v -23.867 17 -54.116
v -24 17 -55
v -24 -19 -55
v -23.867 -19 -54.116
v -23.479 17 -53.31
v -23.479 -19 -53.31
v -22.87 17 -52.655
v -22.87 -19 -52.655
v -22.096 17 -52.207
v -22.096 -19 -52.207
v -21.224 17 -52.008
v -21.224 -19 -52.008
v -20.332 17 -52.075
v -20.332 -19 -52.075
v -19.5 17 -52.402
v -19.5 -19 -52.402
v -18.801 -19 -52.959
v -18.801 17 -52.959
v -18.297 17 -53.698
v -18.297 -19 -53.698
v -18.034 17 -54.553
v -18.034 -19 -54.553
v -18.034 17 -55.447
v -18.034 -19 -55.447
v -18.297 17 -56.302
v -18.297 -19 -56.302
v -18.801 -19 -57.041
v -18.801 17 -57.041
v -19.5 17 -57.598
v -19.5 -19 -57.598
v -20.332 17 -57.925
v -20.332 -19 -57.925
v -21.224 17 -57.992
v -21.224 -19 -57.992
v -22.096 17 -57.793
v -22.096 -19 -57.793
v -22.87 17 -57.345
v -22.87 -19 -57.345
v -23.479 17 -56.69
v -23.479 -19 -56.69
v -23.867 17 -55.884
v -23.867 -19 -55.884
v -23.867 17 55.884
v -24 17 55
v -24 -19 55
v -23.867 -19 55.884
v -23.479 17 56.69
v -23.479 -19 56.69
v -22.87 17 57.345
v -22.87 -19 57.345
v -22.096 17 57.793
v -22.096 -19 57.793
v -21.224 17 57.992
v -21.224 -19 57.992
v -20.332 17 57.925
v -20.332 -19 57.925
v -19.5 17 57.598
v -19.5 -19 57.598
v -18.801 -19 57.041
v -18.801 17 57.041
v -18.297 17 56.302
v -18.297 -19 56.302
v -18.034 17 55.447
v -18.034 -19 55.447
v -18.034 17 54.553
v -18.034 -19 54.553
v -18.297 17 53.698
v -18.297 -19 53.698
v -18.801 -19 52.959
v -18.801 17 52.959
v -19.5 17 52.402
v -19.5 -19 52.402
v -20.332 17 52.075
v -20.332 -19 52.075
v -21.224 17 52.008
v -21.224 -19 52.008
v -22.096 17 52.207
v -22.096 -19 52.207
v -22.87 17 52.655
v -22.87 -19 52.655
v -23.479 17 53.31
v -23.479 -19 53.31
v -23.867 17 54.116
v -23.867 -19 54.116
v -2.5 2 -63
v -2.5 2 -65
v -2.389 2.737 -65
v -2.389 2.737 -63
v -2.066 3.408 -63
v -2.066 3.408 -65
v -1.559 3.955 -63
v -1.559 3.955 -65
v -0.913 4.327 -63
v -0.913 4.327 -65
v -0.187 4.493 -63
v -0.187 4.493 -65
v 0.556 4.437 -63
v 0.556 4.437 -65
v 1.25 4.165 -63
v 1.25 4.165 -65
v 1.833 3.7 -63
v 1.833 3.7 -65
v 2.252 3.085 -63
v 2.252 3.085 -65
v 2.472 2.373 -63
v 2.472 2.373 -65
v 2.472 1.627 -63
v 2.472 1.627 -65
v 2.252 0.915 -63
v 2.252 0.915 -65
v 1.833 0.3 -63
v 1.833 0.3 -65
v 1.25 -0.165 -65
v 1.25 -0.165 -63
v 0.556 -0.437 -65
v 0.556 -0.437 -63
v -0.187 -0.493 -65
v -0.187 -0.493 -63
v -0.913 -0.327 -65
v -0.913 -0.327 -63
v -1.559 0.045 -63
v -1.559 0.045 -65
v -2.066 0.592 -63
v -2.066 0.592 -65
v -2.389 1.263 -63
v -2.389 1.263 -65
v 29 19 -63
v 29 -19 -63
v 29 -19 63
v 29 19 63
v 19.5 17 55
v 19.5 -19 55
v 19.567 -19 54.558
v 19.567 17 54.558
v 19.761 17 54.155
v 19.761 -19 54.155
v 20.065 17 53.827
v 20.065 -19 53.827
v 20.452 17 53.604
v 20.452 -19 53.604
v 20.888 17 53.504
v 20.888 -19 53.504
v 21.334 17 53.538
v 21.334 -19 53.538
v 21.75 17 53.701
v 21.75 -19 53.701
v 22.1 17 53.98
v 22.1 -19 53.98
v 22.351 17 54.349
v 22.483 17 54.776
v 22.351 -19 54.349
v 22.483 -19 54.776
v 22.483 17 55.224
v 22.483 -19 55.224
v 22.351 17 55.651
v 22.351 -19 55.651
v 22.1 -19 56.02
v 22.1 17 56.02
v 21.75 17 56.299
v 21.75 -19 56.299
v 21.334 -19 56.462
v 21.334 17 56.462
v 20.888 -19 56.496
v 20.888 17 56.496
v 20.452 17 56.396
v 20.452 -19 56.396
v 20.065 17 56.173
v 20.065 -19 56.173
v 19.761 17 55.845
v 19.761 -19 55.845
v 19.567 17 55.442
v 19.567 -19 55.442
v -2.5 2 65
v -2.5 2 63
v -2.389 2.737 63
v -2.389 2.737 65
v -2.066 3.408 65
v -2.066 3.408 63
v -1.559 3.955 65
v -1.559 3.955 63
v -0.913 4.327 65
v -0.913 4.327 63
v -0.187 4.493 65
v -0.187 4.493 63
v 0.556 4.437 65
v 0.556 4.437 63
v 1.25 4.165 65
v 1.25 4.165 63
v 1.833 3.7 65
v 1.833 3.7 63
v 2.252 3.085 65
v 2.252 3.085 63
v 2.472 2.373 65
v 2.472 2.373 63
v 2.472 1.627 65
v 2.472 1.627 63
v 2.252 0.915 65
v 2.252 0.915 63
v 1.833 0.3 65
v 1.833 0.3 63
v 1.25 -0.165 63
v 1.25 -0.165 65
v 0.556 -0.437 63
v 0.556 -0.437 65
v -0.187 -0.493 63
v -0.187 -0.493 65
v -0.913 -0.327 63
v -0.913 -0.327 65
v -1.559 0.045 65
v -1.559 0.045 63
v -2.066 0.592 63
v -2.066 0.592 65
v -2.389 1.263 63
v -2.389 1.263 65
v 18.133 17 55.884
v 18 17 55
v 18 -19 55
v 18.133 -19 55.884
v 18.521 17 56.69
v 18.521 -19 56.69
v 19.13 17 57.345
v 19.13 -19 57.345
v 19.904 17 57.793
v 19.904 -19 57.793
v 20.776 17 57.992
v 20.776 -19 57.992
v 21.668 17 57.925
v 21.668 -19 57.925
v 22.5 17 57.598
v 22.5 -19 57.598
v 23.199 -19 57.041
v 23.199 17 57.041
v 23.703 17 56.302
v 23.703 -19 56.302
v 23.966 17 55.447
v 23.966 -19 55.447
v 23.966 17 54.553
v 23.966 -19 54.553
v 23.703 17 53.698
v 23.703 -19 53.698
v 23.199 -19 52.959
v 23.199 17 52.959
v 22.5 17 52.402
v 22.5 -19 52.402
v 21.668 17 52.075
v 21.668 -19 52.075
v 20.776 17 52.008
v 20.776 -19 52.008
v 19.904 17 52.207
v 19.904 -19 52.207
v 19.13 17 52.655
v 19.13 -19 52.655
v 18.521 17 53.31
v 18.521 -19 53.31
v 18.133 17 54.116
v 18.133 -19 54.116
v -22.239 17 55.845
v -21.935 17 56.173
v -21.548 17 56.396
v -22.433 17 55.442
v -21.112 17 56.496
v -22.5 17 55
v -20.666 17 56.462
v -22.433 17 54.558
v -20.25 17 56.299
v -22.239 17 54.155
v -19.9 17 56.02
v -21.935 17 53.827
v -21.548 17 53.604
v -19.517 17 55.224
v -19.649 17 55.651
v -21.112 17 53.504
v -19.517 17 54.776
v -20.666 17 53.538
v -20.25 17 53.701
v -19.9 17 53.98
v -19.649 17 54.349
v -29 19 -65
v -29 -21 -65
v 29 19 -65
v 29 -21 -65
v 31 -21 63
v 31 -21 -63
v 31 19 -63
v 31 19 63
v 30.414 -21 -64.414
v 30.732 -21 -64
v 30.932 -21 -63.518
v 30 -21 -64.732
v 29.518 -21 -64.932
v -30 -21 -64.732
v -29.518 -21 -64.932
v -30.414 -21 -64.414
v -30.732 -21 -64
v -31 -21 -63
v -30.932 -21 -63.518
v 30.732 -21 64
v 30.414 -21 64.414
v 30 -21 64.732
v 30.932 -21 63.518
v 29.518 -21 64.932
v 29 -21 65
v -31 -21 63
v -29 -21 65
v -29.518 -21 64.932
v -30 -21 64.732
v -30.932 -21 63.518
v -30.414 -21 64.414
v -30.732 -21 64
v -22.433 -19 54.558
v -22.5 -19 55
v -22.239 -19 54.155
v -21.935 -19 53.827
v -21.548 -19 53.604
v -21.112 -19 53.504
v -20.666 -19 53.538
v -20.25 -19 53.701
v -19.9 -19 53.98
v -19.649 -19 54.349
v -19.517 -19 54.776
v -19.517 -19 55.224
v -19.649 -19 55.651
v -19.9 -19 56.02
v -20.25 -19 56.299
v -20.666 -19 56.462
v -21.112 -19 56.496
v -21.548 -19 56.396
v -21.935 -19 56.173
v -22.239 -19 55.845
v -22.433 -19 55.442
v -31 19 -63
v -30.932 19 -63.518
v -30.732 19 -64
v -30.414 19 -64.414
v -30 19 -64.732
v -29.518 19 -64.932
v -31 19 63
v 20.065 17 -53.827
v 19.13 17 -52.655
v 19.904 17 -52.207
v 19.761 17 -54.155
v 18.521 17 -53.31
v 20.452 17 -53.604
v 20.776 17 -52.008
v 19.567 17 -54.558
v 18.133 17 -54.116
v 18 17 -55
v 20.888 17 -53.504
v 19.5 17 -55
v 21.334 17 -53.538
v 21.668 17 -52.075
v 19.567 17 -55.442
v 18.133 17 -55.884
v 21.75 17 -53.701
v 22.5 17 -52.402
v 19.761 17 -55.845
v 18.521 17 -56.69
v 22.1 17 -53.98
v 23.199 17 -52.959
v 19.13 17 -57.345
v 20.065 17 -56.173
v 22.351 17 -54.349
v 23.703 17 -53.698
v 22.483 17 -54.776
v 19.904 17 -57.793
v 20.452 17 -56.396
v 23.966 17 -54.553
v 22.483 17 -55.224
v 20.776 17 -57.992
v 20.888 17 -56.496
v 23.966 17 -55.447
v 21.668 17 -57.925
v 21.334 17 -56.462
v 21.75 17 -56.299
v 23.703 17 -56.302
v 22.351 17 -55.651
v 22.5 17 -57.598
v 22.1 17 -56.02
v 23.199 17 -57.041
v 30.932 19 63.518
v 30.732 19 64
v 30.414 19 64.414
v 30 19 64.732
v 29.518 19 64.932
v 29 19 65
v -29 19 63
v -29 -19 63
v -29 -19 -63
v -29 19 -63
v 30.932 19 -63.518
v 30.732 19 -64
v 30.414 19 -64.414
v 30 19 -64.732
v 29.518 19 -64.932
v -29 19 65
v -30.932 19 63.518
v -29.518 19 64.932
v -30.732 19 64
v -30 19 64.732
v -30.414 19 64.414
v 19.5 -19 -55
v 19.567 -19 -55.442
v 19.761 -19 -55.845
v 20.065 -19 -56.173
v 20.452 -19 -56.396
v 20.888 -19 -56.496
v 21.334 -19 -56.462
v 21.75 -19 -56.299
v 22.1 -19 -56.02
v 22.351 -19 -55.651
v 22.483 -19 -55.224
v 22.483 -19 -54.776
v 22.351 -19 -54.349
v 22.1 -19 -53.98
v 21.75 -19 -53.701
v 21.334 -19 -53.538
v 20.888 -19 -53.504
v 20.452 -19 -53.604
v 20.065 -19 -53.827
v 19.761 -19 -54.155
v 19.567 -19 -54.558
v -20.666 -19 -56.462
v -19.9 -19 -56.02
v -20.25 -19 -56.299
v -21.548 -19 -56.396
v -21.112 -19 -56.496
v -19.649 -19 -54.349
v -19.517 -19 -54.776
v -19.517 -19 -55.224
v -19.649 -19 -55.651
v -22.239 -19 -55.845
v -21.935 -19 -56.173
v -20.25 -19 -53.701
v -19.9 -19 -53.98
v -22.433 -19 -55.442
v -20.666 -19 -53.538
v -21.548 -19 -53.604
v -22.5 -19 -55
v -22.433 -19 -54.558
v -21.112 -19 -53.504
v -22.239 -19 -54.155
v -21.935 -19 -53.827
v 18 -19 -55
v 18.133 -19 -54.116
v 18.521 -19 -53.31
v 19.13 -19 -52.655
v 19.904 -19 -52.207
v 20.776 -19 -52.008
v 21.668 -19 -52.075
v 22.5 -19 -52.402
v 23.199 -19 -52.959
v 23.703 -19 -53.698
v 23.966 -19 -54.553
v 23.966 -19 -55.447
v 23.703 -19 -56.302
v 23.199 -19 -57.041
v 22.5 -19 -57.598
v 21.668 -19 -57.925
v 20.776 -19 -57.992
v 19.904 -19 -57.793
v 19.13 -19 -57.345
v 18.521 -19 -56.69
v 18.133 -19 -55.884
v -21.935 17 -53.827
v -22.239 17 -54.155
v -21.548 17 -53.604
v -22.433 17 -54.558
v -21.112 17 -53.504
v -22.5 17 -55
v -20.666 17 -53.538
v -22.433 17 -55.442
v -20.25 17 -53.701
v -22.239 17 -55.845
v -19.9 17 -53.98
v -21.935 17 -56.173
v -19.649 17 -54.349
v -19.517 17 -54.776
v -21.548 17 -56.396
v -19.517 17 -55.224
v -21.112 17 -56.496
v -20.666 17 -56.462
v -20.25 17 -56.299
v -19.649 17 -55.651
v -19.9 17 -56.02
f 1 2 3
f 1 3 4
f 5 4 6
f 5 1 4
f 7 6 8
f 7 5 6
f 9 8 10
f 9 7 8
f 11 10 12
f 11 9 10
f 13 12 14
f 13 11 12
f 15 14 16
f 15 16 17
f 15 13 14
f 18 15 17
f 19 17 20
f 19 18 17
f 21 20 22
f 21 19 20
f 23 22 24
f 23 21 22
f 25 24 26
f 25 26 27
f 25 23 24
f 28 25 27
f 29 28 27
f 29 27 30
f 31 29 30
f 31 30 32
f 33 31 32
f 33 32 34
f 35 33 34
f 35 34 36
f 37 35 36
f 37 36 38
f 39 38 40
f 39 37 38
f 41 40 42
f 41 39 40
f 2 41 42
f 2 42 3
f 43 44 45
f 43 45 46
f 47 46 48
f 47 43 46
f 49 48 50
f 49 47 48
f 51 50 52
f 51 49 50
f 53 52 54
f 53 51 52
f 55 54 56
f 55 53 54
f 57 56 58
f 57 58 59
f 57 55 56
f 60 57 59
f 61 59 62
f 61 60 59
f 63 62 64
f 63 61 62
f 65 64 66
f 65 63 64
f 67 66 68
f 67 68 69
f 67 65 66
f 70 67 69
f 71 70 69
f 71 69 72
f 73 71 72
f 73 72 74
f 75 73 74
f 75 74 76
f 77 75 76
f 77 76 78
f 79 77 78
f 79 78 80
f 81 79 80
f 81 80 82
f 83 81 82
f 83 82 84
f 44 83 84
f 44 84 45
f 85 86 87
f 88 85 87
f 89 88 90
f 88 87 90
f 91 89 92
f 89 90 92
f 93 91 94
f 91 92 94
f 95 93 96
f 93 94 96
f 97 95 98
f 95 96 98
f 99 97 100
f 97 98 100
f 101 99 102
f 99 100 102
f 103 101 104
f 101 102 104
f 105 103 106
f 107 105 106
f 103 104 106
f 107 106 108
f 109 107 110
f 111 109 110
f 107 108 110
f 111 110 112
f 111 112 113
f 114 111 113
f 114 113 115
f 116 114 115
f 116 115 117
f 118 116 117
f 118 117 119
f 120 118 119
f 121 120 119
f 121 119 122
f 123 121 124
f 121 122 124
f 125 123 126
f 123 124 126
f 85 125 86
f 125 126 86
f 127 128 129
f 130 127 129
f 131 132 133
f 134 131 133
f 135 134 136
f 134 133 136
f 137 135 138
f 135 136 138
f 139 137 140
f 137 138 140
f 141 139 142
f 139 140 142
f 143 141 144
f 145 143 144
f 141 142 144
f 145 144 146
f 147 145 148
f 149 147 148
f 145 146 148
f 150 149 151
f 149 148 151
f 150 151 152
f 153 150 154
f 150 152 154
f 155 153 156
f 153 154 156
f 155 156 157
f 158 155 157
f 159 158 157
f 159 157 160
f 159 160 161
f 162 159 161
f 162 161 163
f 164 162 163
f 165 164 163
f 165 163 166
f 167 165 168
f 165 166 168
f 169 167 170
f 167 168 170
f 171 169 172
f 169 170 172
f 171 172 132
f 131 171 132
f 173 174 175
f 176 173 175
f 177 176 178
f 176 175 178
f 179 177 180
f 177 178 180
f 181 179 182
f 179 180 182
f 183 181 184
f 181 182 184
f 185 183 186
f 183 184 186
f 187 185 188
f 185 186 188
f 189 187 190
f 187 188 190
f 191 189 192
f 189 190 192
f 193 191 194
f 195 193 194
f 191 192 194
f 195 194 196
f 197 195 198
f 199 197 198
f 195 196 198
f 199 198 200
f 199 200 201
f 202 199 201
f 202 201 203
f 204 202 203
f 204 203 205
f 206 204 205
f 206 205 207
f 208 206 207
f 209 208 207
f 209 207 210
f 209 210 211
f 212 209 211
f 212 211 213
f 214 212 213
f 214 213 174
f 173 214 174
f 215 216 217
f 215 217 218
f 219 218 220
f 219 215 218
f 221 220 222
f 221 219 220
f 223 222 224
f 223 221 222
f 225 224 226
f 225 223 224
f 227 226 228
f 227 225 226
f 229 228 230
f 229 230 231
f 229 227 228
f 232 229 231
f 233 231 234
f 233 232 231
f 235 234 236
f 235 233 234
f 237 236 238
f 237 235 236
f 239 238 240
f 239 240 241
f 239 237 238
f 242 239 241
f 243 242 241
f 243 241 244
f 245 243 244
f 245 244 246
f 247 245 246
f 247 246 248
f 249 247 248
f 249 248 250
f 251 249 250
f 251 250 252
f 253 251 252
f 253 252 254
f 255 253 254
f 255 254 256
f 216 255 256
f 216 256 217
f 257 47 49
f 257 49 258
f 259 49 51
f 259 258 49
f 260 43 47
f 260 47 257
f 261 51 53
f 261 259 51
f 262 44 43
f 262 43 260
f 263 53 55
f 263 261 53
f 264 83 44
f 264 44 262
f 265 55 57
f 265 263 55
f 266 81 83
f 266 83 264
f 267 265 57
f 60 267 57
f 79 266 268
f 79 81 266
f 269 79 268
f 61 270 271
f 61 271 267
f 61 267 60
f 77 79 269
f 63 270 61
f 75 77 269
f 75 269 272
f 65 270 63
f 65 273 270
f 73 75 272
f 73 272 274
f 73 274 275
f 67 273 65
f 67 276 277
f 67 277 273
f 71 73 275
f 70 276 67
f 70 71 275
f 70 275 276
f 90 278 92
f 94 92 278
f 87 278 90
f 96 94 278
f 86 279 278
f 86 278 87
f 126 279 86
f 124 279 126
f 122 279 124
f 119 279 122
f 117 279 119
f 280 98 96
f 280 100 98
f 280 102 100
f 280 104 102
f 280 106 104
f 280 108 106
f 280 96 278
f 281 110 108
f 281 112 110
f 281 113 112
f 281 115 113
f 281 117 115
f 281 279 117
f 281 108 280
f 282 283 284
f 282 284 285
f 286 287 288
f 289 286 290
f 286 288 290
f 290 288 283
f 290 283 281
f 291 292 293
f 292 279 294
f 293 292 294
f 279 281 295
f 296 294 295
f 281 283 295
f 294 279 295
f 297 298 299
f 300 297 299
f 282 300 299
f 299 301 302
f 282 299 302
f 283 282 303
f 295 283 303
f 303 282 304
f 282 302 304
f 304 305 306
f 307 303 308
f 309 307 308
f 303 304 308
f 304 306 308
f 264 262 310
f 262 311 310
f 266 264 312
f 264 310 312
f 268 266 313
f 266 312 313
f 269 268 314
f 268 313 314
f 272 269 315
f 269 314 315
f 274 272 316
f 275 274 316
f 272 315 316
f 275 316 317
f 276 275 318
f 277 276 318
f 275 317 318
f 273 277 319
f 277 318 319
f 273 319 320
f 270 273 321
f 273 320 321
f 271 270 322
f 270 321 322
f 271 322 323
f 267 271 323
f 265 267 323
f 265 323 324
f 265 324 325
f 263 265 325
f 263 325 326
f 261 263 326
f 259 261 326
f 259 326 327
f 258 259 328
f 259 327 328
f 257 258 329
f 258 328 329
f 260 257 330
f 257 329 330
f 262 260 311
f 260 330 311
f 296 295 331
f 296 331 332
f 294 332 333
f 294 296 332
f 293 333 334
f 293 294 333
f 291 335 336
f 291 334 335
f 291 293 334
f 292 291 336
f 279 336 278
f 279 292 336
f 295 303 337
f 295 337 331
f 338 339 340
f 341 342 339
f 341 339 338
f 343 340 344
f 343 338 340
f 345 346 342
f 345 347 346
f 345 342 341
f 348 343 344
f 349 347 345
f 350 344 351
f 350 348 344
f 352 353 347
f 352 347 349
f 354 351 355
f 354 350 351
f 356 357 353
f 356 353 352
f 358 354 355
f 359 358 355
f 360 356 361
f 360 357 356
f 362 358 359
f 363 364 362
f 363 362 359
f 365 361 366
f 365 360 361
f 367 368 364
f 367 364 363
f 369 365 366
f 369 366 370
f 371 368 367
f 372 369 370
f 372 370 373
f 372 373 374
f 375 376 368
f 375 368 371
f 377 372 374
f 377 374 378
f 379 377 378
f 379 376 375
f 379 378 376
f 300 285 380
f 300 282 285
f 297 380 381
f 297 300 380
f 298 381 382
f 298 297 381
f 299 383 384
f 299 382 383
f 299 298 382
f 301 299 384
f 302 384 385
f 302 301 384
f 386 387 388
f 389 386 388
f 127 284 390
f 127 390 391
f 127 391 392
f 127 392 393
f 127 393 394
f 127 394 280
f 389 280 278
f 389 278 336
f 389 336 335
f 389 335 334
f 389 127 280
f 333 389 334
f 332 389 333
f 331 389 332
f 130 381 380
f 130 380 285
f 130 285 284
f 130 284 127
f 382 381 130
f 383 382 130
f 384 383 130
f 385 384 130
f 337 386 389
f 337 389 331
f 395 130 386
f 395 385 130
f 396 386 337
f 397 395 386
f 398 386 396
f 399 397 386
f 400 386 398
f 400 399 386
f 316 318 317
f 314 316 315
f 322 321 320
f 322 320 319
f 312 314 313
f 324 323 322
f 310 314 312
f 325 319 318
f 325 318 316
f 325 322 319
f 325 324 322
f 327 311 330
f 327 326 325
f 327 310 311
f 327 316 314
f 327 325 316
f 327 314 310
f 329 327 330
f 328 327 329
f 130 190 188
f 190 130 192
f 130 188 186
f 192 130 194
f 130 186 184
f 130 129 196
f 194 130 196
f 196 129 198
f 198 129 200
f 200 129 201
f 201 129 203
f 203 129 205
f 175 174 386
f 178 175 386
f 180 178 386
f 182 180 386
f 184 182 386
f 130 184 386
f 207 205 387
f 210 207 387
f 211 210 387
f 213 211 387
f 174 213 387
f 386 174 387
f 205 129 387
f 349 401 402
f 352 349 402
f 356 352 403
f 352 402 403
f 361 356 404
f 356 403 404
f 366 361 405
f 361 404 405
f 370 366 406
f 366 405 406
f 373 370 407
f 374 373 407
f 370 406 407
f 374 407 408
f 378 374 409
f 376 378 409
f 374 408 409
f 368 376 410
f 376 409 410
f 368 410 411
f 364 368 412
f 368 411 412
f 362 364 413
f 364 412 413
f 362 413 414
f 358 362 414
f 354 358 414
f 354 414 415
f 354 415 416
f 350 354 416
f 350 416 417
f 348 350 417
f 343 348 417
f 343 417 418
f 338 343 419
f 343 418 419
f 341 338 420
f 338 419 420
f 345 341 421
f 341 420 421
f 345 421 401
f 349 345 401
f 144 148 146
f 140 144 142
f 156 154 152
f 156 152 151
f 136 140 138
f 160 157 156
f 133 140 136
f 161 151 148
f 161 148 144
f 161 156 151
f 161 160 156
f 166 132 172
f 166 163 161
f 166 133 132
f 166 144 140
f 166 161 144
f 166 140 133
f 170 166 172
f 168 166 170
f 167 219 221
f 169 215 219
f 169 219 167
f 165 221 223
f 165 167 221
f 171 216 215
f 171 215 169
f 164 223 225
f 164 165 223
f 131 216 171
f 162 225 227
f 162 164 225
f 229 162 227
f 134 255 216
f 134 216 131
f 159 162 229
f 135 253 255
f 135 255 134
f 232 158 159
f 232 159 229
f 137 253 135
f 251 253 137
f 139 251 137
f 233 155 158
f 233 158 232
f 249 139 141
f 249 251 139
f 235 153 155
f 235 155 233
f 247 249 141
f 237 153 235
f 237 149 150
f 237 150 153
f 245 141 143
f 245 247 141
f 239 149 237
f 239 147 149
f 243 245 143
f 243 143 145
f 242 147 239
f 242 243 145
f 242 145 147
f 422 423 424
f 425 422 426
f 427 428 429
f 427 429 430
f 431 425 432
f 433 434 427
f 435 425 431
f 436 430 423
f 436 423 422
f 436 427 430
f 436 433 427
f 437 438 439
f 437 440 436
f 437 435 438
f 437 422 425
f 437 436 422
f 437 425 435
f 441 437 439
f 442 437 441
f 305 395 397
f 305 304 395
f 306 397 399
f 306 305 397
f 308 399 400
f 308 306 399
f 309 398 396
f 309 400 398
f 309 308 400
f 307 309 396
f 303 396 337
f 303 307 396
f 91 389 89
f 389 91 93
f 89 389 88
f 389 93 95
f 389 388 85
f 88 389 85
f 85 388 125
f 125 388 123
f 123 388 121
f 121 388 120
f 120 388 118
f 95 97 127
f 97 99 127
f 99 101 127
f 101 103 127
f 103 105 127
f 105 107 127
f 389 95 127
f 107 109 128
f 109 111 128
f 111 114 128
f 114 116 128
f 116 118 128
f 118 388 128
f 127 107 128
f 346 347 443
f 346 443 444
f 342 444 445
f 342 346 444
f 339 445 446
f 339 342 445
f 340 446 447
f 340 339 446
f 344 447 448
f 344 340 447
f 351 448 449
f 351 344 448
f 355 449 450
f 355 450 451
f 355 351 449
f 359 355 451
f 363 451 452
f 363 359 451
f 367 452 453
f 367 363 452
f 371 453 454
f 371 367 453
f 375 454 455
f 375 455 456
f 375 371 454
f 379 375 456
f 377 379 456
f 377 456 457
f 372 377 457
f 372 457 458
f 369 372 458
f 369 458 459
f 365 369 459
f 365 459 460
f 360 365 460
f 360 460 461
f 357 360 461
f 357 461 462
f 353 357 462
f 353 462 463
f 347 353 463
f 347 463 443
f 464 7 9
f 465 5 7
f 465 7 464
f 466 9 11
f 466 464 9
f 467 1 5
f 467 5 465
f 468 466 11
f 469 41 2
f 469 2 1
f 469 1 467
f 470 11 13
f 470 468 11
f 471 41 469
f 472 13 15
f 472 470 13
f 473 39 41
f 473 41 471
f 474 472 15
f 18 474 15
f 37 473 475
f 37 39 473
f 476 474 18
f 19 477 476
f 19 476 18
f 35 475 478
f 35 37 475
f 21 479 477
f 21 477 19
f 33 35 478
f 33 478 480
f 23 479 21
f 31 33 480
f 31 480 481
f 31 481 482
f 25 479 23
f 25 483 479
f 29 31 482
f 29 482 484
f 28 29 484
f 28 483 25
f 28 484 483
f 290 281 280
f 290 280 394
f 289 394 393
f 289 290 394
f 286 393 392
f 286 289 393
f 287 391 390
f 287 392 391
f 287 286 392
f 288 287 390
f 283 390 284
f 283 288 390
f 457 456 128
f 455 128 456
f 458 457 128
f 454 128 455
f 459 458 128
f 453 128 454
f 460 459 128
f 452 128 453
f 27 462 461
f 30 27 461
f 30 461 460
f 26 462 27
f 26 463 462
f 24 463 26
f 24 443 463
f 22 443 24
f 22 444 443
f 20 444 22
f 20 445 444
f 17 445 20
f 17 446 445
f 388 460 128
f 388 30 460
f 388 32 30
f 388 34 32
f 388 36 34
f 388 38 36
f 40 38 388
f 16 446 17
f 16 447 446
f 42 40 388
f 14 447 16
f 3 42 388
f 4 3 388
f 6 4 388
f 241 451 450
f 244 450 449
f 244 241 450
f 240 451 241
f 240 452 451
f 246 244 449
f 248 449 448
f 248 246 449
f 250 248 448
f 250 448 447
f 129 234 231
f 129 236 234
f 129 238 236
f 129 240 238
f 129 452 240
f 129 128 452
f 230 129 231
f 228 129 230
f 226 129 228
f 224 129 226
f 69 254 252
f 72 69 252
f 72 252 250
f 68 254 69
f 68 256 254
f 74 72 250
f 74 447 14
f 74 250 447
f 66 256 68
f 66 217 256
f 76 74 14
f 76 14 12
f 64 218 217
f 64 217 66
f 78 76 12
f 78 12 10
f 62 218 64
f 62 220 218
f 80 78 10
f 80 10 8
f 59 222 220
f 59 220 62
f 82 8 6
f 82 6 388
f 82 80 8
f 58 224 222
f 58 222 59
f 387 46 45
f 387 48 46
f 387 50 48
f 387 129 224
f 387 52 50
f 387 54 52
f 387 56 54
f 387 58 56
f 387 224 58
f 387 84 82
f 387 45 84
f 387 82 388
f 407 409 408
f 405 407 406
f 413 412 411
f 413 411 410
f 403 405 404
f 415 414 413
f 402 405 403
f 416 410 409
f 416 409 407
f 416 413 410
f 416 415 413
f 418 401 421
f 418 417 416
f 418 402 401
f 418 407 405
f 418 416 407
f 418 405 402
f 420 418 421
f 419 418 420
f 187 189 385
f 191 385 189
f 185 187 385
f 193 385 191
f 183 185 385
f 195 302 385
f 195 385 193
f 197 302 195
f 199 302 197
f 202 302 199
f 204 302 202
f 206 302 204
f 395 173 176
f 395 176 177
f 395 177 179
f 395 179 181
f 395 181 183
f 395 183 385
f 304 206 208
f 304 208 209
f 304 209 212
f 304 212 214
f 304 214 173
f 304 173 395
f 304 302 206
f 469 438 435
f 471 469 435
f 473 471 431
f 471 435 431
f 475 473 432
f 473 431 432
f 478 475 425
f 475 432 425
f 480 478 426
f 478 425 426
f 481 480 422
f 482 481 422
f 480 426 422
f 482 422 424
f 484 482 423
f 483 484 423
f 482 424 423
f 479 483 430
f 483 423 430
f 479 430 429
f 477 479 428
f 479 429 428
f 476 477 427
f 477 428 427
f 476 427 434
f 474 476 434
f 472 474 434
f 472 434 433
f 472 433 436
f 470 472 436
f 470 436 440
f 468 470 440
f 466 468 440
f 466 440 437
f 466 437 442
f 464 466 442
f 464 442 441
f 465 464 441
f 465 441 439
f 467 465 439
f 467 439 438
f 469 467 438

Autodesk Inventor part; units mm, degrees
sketch "Cuerpo" plane through (0, 0, 0) normal (0, 1, 0) x (-1, 0, 0)
  line L0 (0, -91.5799) -> (0, 91.5799) projected
  line L1 (-43.9799, 0) -> (43.9799, 0) projected
  line L2 (29, -65) -> (-29, -65)
  line L3 (-31, -63) -> (-31, 63)
  line L4 (-29, 65) -> (29, 65)
  line L5 (31, 63) -> (31, -63)
  arc A0 (29, -65) -> (31, -63) centre (29, -63) ccw
  arc A1 (-31, -63) -> (-29, -65) centre (-29, -63) ccw
  arc A2 (31, 63) -> (29, 65) centre (29, 63) ccw
  arc A3 (-29, 65) -> (-31, 63) centre (-29, 63) ccw
  circle A4 centre (21, -55) radius 1.5
  circle A5 centre (21, -55) radius 3
  circle A6 centre (-21, -55) radius 1.5
  circle A7 centre (-21, -55) radius 3
  circle A8 centre (21, 55) radius 1.5
  circle A9 centre (21, 55) radius 3
  circle A10 centre (-21, 55) radius 3
  circle A11 centre (-21, 55) radius 1.5
  line L6 (29, -63) -> (-29, -63)
  line L7 (-29, -63) -> (-29, 63)
  line L8 (-29, 63) -> (29, 63)
  line L9 (29, 63) -> (29, -63)
  point P0 (0, 0)
  point P1 (31, -65)
  point P2 (-31, 65)
  dimension "d0" = 31
  dimension "d1" = 65
  dimension "d2" = 31
  dimension "d3" = 65
  dimension "d4" = 2
  dimension "d5" = 10
  dimension "d6" = 10
  dimension "d7" = 10
  dimension "d8" = 10
  dimension "d9" = 10
  dimension "d10" = 10
  dimension "d11" = 10
  dimension "d12" = 10
  dimension "d13" = 3
  dimension "d14" = 6
  dimension "d15" = 3
  dimension "d16" = 6
  dimension "d17" = 3
  dimension "d18" = 6
  dimension "d19" = 6
  dimension "d20" = 3
extrude "Extrusión1" add sketch "Cuerpo" along normal mid plane 38 contours L2 A1 L3 L1 L7 L6 L0 | L0 L6 L9 L1 L5 A0 L2 | L8 L7 L1 L3 A3 L4 L0 | L0 L4 A2 L5 L1 L9 L8 | A5 | A7 | A9 | A10
ref_plane "Plano de trabajo1" through (0, -19, 0) normal (0, 1, 0) x (-1, 0, 0)
sketch "Boceto2" plane through (0, -19, 0) normal (0, 1, 0) x (-1, 0, 0)
  line L0 (-29, -65) -> (29, -65)
  line L1 (31, -63) -> (31, 63)
  line L2 (29, 65) -> (-29, 65)
  line L3 (-31, 63) -> (-31, -63)
  arc A0 (-31, -63) -> (-29, -65) centre (-29, -63) ccw
  arc A1 (29, -65) -> (31, -63) centre (29, -63) ccw
  arc A2 (-29, 65) -> (-31, 63) centre (-29, 63) ccw
  arc A3 (31, 63) -> (29, 65) centre (29, 63) ccw
  line L4 (-43.9799, 0) -> (43.9799, 0) projected
  line L5 (0, -91) -> (0, 91) projected
  point P0 (0, 0)
  dimension "d24" = 2
  dimension "d34" = 65
  dimension "d35" = 65
  dimension "d36" = 31
extrude "Base" add sketch "Boceto2" against normal blind 2
sketch "Boceto3" plane through (29, 19, -65) normal (0, 0, -1) x (-1, 0, 0)
  line L0 (58, -40) -> (0, -40) projected
  line L1 (-2, -40) -> (-2, 0) projected
  circle A0 centre (29, -17) radius 2.5
  point P0 (29, -19)
  dimension "d27" = 23
  dimension "d28" = 31
  dimension "d29" = 5
extrude "Extrusión3" cut sketch "Boceto3" against normal blind 200
sketch "Boceto4" plane through (-21, 19, 55) normal (0, 1, 0) x (1, 0, 0)
  point P0 (21, 55)
sketch "Boceto5" plane through (-21, 19, 55) normal (0, 1, 0) x (1, 0, 0)
  circle A0 centre (0, 0) radius 1.5 projected
  circle A1 centre (0, 0) radius 3
  circle A2 centre (0, 110) radius 1.5 projected
  circle A3 centre (0, 110) radius 3
  circle A4 centre (42, 110) radius 1.5 projected
  circle A5 centre (42, 110) radius 3
  circle A6 centre (42, 0) radius 1.5 projected
  circle A7 centre (42, 0) radius 3
  point P0 (21, 55)
extrude "Extrusión4" cut sketch "Boceto5" against normal blind 2 contours A1 | A2 | A3 | A4 | A5 | A7
equation "\"d2\" = d0"
equation "\"d3\" = d1"
equation "\"d6\" = d5"
equation "\"d7\" = d5"
equation "\"d8\" = d5"
equation "\"d9\" = d5"
equation "\"d10\" = d5"
equation "\"d11\" = d5"
equation "\"d12\" = d5"
equation "\"d15\" = d13"
equation "\"d16\" = d14"
equation "\"d17\" = d13"
equation "\"d18\" = d14"
equation "\"d19\" = d14"
equation "\"d20\" = d13"
properties part number "Resistencia_Cuerpo" material "PVC, no plastificado"
